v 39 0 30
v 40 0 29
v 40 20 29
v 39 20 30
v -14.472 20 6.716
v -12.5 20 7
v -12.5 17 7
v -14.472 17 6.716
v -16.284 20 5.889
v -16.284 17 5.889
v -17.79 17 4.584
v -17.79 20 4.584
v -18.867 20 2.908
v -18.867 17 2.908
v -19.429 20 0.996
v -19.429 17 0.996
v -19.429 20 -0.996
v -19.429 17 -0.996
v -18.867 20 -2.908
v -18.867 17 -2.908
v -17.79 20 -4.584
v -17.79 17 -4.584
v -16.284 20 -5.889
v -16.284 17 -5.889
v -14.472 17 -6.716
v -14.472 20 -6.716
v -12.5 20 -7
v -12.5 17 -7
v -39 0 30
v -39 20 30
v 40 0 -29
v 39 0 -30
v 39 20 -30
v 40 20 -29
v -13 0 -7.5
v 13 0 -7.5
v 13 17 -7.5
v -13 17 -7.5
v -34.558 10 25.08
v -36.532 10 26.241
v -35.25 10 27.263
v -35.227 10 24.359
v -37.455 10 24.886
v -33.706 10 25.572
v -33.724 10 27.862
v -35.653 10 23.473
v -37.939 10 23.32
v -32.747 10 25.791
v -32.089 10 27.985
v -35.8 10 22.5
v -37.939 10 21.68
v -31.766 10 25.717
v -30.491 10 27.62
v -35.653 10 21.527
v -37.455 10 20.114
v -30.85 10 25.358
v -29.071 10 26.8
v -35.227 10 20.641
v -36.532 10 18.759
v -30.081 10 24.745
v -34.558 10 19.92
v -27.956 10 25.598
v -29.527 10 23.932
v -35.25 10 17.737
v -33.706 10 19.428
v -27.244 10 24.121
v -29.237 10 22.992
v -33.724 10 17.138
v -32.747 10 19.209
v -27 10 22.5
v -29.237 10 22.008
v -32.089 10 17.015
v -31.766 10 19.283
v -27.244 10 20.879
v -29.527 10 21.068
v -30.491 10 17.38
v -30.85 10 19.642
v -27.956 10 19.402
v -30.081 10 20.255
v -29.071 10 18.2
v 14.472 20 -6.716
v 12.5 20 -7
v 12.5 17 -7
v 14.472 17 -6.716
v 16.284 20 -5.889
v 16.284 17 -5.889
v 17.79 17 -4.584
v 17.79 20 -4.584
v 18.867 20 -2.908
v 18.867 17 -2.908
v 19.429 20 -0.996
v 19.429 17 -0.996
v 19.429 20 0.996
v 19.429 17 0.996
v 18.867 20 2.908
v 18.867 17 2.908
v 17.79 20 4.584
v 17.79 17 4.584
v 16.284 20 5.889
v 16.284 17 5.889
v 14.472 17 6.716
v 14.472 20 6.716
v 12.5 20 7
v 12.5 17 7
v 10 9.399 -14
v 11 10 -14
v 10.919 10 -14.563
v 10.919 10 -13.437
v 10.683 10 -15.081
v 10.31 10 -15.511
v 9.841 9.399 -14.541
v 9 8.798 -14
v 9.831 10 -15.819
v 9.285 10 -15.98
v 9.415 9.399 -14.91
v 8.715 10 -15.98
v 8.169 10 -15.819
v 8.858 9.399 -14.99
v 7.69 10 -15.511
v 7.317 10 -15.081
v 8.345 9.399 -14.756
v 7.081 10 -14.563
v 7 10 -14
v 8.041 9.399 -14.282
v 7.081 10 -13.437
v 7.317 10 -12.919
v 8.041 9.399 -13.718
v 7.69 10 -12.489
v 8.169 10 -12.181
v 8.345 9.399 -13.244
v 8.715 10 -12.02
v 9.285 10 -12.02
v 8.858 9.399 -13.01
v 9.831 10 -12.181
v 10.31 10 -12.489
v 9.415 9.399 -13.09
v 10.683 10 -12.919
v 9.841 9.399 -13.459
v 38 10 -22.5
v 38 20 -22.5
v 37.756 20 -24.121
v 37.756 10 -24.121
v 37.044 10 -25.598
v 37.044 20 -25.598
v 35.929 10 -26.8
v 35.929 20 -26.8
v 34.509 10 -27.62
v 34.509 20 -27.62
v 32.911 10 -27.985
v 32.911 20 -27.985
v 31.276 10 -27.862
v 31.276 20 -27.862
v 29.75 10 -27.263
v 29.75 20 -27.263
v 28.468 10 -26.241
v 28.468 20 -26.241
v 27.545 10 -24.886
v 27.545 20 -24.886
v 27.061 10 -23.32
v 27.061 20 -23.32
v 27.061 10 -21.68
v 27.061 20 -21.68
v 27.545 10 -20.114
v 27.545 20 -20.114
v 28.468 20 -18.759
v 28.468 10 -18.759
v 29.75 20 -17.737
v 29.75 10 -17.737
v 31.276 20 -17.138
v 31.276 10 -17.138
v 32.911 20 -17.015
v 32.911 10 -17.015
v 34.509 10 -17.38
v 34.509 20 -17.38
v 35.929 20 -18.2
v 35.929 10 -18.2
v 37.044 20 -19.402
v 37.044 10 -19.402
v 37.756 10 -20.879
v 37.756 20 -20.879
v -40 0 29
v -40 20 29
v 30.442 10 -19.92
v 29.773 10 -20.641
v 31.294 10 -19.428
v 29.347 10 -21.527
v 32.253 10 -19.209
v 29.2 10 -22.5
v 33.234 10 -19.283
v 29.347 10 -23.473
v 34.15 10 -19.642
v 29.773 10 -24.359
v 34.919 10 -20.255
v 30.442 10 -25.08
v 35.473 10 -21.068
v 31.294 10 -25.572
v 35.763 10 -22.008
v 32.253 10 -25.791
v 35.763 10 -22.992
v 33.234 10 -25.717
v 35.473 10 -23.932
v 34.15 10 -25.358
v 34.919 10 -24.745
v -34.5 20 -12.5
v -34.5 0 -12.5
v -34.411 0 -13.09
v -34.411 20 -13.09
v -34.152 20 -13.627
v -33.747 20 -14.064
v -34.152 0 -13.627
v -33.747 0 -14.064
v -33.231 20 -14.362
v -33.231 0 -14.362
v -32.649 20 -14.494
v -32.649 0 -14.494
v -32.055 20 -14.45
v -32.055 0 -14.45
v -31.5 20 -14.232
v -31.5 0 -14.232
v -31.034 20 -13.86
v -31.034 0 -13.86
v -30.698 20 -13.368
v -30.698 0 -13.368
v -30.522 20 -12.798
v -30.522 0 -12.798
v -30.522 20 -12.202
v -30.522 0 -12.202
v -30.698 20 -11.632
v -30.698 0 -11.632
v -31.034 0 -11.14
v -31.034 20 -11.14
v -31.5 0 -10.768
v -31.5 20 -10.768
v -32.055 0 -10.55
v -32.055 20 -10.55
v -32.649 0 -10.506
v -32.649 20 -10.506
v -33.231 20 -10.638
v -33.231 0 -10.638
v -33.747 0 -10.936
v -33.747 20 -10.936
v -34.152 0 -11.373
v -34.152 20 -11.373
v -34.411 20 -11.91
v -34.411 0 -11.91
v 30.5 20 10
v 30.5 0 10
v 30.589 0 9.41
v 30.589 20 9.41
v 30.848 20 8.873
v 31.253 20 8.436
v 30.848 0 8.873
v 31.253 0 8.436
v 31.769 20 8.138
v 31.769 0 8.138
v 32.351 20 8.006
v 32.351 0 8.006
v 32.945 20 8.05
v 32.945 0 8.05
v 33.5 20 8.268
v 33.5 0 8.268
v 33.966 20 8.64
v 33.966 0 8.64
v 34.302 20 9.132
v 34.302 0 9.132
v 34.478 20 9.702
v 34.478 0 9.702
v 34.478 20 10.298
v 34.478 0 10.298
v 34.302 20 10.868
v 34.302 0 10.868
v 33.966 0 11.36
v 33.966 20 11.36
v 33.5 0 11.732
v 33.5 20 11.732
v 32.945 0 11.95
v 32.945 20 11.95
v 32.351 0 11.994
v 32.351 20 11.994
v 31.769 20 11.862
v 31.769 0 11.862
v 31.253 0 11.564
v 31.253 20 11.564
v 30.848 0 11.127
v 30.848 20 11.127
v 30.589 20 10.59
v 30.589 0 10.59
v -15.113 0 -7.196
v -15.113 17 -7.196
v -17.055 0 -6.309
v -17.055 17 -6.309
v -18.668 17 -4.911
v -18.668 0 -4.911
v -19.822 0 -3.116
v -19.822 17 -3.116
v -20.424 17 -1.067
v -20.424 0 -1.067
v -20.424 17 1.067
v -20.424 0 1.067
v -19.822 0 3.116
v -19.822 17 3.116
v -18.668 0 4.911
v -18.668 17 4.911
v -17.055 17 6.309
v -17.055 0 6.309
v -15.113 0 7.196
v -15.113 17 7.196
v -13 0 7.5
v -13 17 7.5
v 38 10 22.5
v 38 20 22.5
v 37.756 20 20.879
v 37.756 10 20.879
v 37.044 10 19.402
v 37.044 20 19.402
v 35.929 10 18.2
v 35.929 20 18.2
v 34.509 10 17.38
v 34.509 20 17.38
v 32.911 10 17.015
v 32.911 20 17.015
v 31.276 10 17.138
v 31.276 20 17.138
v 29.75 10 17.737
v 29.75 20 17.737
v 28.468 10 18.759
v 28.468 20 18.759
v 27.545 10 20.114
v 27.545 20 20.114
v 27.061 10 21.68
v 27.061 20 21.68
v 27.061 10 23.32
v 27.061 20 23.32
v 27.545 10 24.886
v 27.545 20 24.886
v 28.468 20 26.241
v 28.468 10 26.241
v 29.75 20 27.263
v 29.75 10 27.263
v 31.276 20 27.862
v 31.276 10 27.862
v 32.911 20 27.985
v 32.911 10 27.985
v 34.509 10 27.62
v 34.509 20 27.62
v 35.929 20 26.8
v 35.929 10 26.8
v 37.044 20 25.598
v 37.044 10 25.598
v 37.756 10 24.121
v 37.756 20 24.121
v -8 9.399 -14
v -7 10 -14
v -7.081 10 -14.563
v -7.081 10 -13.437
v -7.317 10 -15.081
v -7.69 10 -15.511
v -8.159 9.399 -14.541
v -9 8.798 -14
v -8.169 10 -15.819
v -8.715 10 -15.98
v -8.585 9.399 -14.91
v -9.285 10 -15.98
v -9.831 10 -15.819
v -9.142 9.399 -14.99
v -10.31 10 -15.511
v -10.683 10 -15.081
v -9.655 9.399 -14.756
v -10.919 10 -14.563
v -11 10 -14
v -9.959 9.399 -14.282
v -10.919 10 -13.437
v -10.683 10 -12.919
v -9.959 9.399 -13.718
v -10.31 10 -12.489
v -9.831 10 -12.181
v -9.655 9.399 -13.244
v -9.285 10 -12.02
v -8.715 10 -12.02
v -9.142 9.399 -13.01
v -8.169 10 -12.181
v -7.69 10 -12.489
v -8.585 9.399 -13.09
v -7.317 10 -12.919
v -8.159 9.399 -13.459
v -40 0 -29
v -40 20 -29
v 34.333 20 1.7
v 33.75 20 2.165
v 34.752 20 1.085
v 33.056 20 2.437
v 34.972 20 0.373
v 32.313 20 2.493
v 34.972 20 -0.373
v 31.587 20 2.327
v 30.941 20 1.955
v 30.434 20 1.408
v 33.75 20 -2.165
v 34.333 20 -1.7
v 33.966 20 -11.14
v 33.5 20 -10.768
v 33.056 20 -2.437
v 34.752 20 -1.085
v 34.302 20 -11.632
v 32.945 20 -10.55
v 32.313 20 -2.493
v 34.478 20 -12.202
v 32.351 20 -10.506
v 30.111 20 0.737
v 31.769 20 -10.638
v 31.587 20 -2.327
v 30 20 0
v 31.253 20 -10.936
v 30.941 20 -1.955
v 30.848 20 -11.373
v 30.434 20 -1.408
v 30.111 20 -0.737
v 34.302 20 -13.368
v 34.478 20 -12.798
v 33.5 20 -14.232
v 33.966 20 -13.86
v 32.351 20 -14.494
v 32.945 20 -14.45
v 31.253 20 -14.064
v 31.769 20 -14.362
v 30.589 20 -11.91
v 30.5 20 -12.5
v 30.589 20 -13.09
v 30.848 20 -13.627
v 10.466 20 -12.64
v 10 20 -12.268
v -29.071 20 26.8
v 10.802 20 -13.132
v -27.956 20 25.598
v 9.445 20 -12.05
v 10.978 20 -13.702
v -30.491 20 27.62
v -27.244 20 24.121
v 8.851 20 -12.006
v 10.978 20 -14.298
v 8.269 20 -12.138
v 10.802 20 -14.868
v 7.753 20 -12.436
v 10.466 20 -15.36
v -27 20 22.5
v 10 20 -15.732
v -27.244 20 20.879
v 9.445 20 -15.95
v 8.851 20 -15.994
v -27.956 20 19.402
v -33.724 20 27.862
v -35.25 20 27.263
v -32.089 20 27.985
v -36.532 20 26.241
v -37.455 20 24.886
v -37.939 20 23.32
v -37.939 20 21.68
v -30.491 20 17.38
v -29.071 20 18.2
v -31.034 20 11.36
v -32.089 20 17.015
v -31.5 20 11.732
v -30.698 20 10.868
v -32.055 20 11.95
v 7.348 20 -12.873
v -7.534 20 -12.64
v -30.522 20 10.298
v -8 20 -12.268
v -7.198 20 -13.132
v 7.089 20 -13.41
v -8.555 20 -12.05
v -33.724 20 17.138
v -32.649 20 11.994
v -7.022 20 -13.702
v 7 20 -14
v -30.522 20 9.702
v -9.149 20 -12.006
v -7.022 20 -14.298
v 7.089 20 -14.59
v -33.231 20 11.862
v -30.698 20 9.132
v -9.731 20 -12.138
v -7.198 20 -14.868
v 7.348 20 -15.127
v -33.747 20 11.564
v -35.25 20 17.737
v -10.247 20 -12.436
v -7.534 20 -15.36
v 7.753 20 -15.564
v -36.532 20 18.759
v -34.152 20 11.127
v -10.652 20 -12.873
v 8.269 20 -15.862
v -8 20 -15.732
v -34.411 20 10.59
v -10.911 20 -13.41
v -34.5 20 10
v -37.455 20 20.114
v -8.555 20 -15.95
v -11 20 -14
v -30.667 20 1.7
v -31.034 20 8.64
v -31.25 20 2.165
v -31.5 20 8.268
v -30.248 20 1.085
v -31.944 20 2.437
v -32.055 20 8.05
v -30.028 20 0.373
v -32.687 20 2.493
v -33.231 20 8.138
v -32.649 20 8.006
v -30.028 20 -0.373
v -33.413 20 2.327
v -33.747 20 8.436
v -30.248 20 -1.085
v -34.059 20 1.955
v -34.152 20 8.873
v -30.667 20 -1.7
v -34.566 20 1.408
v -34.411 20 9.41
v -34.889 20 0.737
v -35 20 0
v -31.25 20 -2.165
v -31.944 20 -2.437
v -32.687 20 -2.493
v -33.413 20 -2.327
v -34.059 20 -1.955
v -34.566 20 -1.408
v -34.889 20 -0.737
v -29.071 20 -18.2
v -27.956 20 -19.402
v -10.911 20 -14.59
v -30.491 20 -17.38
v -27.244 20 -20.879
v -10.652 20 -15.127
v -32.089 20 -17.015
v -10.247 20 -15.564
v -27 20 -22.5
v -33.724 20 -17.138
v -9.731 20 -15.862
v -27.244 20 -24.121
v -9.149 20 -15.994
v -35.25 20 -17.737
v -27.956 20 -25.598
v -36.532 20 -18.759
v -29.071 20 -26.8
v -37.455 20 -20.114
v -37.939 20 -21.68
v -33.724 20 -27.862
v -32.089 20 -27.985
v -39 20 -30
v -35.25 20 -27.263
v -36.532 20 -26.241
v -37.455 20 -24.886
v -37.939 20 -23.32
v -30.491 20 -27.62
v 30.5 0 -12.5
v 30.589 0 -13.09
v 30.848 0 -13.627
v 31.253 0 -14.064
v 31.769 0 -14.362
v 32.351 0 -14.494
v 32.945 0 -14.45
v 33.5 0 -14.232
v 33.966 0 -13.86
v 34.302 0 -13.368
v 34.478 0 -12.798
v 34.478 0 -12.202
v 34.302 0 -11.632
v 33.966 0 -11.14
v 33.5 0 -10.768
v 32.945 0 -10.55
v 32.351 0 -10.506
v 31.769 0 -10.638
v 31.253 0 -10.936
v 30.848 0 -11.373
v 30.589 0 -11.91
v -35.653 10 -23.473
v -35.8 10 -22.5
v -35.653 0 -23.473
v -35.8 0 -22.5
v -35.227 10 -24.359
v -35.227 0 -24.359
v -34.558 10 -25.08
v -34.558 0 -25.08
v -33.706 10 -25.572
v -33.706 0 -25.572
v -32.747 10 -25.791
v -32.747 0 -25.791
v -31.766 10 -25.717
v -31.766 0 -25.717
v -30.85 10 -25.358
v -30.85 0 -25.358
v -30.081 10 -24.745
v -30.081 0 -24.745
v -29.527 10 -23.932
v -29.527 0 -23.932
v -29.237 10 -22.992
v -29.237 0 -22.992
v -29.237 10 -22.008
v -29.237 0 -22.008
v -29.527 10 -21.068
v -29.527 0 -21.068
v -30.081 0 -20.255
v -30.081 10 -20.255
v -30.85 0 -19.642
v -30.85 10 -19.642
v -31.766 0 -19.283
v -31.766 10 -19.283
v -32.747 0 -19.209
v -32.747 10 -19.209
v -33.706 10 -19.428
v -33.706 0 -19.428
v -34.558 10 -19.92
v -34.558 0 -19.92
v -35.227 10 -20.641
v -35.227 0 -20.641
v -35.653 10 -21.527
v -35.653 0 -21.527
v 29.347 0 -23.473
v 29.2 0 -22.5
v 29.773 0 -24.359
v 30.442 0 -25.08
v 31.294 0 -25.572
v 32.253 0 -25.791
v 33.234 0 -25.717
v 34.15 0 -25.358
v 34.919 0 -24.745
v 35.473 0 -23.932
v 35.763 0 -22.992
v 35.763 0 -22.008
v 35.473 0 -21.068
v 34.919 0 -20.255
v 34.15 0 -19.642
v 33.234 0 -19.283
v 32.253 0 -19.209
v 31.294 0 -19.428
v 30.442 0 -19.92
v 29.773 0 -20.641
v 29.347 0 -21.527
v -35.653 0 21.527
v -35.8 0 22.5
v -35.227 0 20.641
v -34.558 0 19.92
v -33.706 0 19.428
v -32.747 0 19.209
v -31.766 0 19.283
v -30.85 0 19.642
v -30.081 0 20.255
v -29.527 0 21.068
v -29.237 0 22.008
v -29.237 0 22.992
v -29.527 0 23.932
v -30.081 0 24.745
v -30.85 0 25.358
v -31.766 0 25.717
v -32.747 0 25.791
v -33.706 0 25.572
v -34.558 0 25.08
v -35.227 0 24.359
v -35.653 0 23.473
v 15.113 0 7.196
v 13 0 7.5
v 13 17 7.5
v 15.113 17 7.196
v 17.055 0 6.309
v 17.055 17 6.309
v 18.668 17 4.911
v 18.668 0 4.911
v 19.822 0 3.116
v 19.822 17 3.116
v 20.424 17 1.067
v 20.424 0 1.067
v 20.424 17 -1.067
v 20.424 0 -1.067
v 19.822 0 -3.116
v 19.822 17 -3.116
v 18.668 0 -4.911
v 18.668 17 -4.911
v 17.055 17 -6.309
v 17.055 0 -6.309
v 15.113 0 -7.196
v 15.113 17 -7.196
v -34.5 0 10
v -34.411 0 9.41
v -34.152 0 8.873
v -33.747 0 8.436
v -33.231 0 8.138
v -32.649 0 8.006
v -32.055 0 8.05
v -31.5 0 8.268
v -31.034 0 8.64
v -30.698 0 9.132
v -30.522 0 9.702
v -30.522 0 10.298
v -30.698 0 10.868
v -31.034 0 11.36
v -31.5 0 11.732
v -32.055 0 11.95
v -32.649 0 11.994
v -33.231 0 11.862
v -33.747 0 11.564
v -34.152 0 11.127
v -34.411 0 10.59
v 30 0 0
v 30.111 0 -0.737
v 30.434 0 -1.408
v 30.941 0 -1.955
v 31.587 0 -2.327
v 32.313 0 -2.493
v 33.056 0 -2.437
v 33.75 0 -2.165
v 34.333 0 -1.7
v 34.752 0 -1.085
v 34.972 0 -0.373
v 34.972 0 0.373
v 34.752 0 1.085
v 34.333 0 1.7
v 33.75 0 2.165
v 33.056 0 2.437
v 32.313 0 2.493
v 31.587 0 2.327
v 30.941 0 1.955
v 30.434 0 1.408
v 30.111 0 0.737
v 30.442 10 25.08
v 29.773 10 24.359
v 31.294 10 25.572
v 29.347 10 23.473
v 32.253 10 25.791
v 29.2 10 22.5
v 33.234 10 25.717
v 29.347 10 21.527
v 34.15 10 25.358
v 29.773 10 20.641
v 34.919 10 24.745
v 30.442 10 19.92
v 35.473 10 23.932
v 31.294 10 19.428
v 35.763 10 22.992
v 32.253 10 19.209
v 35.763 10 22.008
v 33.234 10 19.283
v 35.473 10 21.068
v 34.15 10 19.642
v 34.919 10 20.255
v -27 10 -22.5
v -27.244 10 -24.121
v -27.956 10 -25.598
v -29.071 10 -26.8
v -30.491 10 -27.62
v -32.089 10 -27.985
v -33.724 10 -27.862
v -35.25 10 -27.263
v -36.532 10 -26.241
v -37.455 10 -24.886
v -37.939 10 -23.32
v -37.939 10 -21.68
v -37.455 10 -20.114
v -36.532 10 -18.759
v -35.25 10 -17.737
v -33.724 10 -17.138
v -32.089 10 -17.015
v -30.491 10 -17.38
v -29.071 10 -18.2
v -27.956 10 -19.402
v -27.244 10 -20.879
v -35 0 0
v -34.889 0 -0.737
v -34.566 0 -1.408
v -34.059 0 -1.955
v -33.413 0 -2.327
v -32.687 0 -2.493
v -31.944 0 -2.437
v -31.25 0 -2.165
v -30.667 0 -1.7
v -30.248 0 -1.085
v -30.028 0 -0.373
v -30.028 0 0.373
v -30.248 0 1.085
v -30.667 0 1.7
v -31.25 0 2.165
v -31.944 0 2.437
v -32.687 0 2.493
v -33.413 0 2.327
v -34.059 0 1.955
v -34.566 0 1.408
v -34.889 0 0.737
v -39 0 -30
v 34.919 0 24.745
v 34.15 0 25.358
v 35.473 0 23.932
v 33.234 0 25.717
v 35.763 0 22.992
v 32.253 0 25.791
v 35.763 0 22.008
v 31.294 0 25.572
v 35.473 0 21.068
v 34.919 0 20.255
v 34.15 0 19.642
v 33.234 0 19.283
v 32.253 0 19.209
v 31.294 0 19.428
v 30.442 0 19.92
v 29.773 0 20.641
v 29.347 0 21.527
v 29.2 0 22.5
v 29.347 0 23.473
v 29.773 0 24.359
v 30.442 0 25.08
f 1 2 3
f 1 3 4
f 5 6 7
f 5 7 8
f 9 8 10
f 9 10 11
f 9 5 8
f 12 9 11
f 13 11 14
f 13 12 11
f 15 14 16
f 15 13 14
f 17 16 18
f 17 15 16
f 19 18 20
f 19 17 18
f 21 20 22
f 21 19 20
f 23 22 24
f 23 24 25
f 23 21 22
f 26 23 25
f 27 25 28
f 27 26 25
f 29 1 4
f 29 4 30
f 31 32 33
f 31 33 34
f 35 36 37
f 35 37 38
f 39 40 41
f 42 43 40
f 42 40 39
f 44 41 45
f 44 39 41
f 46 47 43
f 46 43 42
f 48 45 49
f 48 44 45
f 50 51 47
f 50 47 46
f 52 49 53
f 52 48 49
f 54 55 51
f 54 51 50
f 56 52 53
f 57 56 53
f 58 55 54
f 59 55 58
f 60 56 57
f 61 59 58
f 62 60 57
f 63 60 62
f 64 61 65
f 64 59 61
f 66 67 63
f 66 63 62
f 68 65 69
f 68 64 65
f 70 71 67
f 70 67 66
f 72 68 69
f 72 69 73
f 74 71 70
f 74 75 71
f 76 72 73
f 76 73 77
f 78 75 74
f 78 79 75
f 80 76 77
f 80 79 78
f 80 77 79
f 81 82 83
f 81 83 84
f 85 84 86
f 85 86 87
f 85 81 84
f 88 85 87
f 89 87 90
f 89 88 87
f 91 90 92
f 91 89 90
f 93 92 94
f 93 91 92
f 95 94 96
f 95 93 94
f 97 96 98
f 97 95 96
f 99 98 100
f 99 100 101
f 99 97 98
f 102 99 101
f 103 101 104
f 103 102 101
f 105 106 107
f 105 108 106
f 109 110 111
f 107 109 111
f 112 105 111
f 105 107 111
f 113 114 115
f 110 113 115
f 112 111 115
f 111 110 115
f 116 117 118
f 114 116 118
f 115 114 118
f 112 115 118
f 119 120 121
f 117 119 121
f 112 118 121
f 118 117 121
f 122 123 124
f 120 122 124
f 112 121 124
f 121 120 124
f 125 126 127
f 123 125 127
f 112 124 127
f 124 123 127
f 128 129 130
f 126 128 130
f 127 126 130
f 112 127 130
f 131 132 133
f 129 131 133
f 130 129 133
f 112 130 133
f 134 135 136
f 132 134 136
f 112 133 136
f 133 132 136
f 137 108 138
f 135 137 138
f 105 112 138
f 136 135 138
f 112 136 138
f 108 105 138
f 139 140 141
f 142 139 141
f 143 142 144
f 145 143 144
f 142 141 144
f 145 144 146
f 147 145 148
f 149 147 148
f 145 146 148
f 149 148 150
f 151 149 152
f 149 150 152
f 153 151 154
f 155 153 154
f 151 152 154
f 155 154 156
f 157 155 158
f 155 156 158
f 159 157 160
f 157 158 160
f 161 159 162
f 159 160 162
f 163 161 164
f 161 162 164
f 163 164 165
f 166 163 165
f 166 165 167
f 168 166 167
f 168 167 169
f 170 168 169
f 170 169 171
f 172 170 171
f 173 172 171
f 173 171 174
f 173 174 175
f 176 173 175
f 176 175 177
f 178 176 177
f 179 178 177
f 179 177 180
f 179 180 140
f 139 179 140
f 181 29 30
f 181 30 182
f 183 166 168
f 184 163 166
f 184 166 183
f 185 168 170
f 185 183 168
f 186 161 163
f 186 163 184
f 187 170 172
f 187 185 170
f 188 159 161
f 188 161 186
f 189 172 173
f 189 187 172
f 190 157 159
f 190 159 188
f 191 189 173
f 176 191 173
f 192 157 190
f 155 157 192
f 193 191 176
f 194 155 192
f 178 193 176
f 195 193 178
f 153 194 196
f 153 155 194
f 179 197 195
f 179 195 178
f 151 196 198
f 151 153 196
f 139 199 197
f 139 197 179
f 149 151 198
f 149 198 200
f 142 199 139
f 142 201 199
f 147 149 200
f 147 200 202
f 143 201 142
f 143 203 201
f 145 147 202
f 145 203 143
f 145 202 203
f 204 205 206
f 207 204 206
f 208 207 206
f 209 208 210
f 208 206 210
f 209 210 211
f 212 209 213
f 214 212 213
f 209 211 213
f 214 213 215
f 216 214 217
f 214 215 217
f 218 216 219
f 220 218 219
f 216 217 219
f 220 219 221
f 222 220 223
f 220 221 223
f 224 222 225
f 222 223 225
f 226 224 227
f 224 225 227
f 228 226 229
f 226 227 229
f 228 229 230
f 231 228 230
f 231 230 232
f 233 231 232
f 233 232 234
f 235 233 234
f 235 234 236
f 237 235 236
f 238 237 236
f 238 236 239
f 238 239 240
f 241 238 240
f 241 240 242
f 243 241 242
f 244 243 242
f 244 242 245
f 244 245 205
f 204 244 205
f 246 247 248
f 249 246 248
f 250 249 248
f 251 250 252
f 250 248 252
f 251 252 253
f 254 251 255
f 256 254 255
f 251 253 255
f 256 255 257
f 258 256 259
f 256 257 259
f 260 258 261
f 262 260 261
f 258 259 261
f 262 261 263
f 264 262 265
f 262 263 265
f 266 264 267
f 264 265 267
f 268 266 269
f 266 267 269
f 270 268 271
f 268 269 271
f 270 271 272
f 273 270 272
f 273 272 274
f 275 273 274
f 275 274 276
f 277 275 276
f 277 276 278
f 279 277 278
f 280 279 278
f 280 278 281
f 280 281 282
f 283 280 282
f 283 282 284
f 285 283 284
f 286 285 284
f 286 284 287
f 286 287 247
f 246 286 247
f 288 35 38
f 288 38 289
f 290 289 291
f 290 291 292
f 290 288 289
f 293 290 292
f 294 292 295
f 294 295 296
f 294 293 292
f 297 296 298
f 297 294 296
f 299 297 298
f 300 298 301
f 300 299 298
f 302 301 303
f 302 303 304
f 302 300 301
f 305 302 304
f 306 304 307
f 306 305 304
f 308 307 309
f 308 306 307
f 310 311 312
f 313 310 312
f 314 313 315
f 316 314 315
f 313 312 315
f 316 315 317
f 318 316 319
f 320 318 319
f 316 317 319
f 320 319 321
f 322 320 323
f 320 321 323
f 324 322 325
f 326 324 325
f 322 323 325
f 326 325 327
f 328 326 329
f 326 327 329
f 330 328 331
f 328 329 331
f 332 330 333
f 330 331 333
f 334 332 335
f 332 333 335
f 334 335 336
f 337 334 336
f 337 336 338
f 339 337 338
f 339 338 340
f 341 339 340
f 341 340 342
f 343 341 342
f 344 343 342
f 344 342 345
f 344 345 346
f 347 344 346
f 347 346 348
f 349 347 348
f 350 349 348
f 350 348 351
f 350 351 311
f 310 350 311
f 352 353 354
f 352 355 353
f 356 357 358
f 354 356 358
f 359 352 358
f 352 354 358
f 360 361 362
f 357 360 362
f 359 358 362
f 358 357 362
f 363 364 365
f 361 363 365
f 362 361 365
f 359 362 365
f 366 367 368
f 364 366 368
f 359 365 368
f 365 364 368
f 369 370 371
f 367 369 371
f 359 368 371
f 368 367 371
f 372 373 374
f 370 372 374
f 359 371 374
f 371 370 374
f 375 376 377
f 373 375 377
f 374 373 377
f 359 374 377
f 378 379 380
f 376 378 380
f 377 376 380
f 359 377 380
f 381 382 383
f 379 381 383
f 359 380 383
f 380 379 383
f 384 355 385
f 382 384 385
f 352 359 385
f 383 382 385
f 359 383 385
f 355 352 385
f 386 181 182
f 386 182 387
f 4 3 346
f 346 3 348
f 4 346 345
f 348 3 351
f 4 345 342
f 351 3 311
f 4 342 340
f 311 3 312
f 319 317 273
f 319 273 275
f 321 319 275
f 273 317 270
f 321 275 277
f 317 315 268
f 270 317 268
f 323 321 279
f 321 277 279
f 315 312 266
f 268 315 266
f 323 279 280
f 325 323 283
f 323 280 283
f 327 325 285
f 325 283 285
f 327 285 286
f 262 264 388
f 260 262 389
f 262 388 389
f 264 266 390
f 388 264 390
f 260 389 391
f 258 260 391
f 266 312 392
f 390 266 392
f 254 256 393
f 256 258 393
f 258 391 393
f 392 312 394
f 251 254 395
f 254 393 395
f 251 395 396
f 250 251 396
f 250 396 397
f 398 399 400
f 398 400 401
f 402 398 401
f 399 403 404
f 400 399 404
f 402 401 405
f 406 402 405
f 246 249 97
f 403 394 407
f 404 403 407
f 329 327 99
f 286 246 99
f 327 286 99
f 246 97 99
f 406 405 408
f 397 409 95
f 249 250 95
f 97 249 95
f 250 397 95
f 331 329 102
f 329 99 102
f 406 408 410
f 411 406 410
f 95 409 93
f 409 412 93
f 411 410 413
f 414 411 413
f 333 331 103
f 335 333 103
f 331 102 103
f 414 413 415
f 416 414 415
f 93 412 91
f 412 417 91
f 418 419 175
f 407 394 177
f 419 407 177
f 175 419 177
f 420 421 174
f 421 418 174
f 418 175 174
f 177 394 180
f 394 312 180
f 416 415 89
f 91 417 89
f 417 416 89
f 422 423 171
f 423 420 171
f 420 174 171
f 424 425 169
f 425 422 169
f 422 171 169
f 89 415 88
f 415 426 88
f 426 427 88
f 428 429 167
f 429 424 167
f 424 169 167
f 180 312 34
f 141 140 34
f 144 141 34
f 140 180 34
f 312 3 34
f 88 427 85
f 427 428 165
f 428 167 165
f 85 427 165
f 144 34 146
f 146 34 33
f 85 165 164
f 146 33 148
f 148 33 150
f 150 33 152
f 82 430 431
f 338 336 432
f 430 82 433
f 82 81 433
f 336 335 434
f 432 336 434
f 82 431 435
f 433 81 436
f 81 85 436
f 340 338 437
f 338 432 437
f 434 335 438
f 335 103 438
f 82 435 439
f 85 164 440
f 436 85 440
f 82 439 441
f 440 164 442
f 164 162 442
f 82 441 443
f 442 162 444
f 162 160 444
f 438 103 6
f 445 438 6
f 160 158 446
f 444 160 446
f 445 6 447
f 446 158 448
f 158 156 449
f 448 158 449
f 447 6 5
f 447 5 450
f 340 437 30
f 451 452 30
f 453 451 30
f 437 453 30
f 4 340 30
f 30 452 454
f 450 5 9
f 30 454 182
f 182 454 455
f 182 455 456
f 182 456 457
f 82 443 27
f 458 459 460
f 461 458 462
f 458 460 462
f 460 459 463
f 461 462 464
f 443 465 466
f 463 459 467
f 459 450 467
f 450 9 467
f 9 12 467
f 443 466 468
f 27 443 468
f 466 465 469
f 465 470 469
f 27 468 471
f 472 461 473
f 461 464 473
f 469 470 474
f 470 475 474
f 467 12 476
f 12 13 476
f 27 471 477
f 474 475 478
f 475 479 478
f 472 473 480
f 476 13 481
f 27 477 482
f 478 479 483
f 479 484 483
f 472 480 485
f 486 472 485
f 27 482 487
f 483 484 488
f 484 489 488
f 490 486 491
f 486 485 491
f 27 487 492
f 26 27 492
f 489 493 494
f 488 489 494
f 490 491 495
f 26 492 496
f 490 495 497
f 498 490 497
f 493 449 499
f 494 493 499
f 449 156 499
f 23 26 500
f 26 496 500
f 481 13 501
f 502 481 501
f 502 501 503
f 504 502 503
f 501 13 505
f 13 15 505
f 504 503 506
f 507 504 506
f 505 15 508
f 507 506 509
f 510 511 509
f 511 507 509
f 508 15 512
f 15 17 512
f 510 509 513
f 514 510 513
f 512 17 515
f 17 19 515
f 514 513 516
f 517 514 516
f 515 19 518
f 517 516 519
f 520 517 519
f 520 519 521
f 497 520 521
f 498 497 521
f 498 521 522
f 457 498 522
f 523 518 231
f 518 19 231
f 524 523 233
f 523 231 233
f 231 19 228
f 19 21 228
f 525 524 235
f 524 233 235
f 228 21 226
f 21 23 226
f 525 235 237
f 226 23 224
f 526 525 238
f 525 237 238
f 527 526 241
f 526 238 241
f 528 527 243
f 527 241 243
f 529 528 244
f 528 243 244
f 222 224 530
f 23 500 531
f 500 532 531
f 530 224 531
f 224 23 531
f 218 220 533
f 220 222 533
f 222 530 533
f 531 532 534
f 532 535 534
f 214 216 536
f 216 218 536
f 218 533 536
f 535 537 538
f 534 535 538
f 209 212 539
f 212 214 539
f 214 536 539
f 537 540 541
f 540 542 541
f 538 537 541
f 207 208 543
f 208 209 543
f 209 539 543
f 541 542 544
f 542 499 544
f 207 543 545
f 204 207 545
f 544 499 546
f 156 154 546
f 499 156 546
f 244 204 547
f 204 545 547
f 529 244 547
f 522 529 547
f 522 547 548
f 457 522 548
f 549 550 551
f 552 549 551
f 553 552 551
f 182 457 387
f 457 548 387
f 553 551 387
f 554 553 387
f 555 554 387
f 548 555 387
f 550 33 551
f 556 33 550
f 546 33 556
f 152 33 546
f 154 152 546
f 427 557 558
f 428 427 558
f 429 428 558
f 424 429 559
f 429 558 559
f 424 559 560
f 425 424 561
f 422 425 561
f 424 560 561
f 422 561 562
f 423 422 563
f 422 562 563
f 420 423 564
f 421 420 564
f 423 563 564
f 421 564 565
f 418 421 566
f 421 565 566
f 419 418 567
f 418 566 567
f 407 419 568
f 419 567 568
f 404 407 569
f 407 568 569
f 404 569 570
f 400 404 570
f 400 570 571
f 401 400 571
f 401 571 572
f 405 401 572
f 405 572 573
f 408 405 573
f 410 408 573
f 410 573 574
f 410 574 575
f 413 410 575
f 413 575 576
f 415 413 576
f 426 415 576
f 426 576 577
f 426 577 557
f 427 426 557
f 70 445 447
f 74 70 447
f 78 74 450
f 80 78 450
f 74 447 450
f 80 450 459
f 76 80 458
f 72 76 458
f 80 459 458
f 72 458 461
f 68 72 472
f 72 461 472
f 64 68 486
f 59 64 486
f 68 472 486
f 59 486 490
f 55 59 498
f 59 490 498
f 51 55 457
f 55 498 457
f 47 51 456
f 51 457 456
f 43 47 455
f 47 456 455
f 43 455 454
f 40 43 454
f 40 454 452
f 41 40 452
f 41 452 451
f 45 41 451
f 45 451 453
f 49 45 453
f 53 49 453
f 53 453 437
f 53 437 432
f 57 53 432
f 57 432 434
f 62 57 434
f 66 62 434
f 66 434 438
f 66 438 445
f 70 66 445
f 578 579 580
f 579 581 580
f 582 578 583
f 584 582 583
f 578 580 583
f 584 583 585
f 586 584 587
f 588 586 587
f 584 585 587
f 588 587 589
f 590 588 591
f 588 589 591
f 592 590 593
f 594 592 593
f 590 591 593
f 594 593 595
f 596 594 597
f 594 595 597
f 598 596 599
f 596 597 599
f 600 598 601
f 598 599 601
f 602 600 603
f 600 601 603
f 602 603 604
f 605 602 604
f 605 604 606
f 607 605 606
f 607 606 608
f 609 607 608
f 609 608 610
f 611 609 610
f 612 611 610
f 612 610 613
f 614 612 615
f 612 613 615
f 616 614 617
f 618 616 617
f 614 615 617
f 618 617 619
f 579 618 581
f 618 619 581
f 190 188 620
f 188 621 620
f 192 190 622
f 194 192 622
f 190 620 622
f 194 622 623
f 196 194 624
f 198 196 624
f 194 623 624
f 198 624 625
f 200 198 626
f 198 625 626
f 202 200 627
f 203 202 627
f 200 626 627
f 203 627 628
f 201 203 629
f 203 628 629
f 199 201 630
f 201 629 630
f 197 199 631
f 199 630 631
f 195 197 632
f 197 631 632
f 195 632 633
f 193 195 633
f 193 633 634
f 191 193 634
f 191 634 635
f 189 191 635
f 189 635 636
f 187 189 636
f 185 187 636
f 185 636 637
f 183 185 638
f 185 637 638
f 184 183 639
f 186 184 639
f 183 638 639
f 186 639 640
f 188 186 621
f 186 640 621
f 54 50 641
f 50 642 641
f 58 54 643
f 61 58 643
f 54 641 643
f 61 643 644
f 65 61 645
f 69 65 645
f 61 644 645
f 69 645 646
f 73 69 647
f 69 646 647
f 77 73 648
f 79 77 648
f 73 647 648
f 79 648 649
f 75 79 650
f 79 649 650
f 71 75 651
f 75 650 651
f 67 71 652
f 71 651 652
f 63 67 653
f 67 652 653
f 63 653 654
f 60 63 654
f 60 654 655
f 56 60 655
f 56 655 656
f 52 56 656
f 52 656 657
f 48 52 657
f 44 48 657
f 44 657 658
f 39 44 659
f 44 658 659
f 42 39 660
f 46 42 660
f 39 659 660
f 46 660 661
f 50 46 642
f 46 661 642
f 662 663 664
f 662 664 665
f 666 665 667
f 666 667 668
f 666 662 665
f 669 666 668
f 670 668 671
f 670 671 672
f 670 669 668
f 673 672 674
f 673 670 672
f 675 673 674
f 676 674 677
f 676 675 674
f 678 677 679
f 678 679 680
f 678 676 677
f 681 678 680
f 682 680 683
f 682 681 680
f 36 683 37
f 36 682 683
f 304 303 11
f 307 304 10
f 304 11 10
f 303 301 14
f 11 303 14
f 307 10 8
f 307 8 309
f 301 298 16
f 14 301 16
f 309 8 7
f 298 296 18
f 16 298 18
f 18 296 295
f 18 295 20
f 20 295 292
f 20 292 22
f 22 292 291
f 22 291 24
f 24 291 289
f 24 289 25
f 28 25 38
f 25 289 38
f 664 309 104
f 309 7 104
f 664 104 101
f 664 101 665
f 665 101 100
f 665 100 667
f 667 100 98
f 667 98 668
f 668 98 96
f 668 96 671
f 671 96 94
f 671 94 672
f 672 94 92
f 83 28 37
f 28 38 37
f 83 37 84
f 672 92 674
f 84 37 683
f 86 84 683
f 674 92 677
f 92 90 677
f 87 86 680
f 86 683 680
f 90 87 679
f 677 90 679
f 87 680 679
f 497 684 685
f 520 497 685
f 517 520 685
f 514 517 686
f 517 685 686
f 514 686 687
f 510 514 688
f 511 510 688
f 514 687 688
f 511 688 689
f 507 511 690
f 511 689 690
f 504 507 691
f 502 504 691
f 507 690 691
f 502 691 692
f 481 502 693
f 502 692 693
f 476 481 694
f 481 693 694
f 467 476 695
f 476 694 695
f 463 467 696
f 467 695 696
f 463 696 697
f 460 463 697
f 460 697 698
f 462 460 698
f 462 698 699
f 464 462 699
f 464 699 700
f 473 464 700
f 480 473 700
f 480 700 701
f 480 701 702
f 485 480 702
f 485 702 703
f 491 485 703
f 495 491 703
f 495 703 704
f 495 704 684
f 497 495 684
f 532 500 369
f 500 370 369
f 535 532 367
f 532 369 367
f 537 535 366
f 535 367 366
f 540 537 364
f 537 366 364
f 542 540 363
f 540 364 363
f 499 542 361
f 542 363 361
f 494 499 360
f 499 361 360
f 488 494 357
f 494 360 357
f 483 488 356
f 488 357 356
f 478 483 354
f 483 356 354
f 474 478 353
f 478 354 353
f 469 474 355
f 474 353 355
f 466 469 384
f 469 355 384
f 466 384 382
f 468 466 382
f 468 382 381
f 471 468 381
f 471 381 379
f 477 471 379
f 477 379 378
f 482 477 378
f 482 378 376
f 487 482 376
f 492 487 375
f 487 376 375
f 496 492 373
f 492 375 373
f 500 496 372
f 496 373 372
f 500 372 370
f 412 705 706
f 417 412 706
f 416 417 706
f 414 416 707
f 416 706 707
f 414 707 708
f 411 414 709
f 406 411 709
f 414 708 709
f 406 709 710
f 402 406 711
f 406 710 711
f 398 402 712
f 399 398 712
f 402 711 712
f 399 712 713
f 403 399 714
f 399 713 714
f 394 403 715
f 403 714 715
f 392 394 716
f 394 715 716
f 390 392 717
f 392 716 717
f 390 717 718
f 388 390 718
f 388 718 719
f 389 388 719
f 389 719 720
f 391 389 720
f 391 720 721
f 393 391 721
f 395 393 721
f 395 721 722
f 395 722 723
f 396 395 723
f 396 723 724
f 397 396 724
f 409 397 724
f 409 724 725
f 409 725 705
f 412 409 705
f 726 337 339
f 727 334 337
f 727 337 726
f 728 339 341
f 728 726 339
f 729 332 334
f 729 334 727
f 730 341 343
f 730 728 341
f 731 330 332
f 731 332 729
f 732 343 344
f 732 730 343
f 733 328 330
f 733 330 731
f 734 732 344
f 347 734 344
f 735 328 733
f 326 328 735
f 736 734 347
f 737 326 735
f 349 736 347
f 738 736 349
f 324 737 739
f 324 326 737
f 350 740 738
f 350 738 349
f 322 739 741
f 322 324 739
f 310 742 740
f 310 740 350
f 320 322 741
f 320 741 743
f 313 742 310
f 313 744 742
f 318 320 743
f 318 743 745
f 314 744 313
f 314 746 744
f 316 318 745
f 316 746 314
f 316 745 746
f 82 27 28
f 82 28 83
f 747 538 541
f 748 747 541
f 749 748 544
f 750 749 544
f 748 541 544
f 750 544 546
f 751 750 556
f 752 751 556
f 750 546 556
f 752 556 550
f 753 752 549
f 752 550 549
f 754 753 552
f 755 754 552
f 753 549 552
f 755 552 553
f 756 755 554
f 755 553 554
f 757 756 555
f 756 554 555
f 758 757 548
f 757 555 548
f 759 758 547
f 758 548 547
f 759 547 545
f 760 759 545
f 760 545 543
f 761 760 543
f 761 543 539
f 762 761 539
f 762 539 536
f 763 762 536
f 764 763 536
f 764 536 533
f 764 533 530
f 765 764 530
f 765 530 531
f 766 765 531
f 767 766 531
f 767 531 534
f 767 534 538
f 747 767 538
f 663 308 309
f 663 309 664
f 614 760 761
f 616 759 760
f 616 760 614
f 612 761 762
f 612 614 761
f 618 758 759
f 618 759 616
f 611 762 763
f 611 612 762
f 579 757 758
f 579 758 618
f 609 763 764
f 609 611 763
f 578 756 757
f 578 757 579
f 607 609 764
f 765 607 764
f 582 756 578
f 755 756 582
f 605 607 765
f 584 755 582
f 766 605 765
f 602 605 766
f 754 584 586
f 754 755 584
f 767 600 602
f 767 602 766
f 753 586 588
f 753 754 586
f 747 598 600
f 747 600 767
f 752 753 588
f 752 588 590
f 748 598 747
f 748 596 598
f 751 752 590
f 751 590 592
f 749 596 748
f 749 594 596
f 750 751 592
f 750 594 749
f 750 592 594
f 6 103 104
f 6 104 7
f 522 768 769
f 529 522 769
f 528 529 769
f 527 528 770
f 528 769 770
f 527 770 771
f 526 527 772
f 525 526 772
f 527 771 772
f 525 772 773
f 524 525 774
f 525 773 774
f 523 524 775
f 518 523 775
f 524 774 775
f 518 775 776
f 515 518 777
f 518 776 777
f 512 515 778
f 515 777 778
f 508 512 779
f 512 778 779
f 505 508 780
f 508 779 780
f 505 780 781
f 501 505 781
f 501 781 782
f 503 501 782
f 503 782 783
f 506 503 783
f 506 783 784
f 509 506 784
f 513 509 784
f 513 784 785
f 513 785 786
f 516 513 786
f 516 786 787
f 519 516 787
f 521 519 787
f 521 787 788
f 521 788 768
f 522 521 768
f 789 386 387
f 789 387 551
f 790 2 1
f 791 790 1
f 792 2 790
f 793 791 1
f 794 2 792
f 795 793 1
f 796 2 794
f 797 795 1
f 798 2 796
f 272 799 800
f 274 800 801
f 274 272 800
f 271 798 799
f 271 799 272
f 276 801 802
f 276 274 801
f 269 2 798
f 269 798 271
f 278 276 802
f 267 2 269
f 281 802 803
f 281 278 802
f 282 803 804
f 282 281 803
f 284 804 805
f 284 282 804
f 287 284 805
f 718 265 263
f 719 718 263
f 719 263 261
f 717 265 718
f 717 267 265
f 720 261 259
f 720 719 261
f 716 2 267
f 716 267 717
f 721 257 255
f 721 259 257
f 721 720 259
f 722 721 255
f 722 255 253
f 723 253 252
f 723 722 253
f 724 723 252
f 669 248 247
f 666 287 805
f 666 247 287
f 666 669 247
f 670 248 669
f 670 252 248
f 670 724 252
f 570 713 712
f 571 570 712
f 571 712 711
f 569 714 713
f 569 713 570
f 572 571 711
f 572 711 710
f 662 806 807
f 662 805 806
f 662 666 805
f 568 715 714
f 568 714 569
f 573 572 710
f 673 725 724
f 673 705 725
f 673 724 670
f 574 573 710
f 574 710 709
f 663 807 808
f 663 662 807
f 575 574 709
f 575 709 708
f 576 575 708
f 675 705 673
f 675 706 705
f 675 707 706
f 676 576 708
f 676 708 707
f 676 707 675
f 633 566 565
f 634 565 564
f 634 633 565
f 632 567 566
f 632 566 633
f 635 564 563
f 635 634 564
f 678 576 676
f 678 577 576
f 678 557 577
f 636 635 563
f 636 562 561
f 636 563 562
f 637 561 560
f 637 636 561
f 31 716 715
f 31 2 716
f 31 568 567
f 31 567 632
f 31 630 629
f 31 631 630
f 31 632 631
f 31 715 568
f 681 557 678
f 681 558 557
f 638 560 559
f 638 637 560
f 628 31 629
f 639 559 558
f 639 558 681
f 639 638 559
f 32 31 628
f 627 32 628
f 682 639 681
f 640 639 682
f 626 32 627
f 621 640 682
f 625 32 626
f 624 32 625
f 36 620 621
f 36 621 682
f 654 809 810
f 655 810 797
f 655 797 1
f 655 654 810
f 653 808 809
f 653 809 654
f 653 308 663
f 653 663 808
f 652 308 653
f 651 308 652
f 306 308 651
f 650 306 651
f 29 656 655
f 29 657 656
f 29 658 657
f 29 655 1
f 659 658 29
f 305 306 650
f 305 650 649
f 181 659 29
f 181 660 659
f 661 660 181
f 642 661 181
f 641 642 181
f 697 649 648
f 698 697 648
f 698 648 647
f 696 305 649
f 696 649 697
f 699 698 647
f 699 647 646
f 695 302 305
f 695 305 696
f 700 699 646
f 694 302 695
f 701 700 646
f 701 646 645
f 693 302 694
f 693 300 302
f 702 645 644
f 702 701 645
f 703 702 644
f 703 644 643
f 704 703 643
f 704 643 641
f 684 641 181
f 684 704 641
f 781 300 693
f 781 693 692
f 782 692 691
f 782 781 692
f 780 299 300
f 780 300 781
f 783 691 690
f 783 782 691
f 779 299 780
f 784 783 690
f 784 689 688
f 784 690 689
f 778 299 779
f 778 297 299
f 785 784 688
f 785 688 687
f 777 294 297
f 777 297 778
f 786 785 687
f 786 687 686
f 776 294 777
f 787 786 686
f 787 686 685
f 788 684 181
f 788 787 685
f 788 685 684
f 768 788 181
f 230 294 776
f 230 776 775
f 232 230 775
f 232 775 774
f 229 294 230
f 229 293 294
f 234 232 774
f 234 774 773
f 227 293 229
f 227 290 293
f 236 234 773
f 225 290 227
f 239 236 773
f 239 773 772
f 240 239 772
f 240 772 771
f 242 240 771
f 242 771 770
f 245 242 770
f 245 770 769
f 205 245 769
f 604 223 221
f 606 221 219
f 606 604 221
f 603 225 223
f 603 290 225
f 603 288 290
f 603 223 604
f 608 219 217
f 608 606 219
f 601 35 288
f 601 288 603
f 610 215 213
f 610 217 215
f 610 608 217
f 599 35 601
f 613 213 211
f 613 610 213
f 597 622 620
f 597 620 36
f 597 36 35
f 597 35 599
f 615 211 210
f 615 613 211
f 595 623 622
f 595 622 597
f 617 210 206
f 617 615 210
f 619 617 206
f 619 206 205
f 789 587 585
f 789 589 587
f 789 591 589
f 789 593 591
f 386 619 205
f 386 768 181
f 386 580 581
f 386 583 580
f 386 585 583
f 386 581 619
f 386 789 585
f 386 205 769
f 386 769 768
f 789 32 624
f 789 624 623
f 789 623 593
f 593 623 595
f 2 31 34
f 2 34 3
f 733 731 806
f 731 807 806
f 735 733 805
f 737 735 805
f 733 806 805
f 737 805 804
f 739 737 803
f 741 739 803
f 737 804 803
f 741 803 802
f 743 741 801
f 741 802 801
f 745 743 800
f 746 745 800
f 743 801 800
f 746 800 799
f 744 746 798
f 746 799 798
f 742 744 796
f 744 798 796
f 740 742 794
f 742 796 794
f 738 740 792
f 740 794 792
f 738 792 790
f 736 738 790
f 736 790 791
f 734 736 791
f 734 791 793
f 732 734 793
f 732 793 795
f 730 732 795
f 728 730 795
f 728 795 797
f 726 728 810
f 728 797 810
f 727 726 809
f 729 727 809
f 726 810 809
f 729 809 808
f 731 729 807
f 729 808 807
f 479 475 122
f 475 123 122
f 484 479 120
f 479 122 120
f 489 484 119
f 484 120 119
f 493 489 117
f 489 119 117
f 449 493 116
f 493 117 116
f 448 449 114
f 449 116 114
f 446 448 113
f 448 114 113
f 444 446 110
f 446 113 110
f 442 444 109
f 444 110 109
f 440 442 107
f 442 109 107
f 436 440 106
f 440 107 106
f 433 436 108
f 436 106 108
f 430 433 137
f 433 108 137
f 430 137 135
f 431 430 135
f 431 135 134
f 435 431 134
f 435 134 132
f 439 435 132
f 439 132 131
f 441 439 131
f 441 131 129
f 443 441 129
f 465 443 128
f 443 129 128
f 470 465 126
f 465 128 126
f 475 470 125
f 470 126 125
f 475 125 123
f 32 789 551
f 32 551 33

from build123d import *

# Parameters (mm, degrees)
BOSS_EXTRUDE1_DEPTH                              = 20
CUT_EXTRUDE1_DEPTH                               = 3
CUT_EXTRUDE3_DEPTH                               = 17
F_4_0MM_DOWEL_HOLE1_D                            = 4
F_4_0MM_DOWEL_HOLE1_DEPTH                        = 10
F_4_0MM_DOWEL_HOLE1_TIP                          = 1.201721238
M6X1_0_TAPPED_HOLE1_D                            = 5
CBORE_FOR_M5_HEX_HEAD_MACHINE_SCREW1_D           = 6.6
CBORE_FOR_M5_HEX_HEAD_MACHINE_SCREW1_CBORE_D     = 11
CBORE_FOR_M5_HEX_HEAD_MACHINE_SCREW1_CBORE_DEPTH = 10
F_4_0MM_DOWEL_HOLE2_D                            = 4


with BuildPart() as part:
    # Sketch1 → Boss-Extrude1 (new body)
    with BuildSketch(Plane(origin=(0, 0, 0), x_dir=(1, 0, 0), z_dir=(0, 1, 0))):
        Polygon((39, 30), (40, 29), (40, -29), (39, -30), (-39, -30), (-40, -29), (-40, 29), (-39, 30), align=None)
    extrude(amount=BOSS_EXTRUDE1_DEPTH)

    # Sketch2 → Cut-Extrude1 (cut)
    with BuildSketch(Plane(origin=(0, 20, 0), x_dir=(1, 0, 0), z_dir=(0, 1, 0))):
        with BuildLine():
            Line((-12.5, 7), (12.5, 7))
            ThreePointArc((12.5, 7), (19.5, 0), (12.5, -7))
            Line((12.5, -7), (-12.5, -7))
            ThreePointArc((-12.5, -7), (-19.5, 0), (-12.5, 7))
        make_face()
    extrude(amount=-CUT_EXTRUDE1_DEPTH, mode=Mode.SUBTRACT)

    # Sketch3 → Cut-Extrude3 (cut)
    with BuildSketch(Plane(origin=(0, 0, 0), x_dir=(-1, 0, 0), z_dir=(0, -1, 0))):
        with BuildLine():
            Line((13, -7.5), (-13, -7.5))
            ThreePointArc((-13, -7.5), (-20.5, 0), (-13, 7.5))
            Line((-13, 7.5), (13, 7.5))
            ThreePointArc((13, 7.5), (20.5, 0), (13, -7.5))
        make_face()
    extrude(amount=-CUT_EXTRUDE3_DEPTH, mode=Mode.SUBTRACT)

    # Ø4.0mm Dowel Hole1
    with Locations(Plane(origin=(0, 20, 0), x_dir=(1, 0, 0), z_dir=(0, 1, 0))):
        with Locations((9, 14), (-9, 14)):
            Hole(F_4_0MM_DOWEL_HOLE1_D / 2, depth=F_4_0MM_DOWEL_HOLE1_DEPTH)
            with Locations((0, 0, -(F_4_0MM_DOWEL_HOLE1_DEPTH + F_4_0MM_DOWEL_HOLE1_TIP / 2))):  # 118° drill point
                Cone(0, F_4_0MM_DOWEL_HOLE1_D / 2, F_4_0MM_DOWEL_HOLE1_TIP, mode=Mode.SUBTRACT)

    # M6x1.0 Tapped Hole1 (through all)
    with Locations(Plane(origin=(0, 20, 0), x_dir=(1, 0, 0), z_dir=(0, 1, 0))):
        with Locations((-32.5, 0), (32.5, 0)):
            Hole(M6X1_0_TAPPED_HOLE1_D / 2)

    # CBORE for M5 Hex Head Machine Screw1 (through all)
    with Locations(Plane(origin=(0, 20, 0), x_dir=(1, 0, 0), z_dir=(0, 1, 0))):
        with Locations((-32.5, -22.5), (-32.5, 22.5), (32.5, 22.5), (32.5, -22.5)):
            CounterBoreHole(CBORE_FOR_M5_HEX_HEAD_MACHINE_SCREW1_D / 2, CBORE_FOR_M5_HEX_HEAD_MACHINE_SCREW1_CBORE_D / 2, CBORE_FOR_M5_HEX_HEAD_MACHINE_SCREW1_CBORE_DEPTH)

    # Ø4.0mm Dowel Hole2 (through all)
    with Locations(Plane(origin=(0, 20, 0), x_dir=(1, 0, 0), z_dir=(0, 1, 0))):
        with Locations((32.5, 12.5), (32.5, -10), (-32.5, -10), (-32.5, 12.5)):
            Hole(F_4_0MM_DOWEL_HOLE2_D / 2)


solid = part.part
